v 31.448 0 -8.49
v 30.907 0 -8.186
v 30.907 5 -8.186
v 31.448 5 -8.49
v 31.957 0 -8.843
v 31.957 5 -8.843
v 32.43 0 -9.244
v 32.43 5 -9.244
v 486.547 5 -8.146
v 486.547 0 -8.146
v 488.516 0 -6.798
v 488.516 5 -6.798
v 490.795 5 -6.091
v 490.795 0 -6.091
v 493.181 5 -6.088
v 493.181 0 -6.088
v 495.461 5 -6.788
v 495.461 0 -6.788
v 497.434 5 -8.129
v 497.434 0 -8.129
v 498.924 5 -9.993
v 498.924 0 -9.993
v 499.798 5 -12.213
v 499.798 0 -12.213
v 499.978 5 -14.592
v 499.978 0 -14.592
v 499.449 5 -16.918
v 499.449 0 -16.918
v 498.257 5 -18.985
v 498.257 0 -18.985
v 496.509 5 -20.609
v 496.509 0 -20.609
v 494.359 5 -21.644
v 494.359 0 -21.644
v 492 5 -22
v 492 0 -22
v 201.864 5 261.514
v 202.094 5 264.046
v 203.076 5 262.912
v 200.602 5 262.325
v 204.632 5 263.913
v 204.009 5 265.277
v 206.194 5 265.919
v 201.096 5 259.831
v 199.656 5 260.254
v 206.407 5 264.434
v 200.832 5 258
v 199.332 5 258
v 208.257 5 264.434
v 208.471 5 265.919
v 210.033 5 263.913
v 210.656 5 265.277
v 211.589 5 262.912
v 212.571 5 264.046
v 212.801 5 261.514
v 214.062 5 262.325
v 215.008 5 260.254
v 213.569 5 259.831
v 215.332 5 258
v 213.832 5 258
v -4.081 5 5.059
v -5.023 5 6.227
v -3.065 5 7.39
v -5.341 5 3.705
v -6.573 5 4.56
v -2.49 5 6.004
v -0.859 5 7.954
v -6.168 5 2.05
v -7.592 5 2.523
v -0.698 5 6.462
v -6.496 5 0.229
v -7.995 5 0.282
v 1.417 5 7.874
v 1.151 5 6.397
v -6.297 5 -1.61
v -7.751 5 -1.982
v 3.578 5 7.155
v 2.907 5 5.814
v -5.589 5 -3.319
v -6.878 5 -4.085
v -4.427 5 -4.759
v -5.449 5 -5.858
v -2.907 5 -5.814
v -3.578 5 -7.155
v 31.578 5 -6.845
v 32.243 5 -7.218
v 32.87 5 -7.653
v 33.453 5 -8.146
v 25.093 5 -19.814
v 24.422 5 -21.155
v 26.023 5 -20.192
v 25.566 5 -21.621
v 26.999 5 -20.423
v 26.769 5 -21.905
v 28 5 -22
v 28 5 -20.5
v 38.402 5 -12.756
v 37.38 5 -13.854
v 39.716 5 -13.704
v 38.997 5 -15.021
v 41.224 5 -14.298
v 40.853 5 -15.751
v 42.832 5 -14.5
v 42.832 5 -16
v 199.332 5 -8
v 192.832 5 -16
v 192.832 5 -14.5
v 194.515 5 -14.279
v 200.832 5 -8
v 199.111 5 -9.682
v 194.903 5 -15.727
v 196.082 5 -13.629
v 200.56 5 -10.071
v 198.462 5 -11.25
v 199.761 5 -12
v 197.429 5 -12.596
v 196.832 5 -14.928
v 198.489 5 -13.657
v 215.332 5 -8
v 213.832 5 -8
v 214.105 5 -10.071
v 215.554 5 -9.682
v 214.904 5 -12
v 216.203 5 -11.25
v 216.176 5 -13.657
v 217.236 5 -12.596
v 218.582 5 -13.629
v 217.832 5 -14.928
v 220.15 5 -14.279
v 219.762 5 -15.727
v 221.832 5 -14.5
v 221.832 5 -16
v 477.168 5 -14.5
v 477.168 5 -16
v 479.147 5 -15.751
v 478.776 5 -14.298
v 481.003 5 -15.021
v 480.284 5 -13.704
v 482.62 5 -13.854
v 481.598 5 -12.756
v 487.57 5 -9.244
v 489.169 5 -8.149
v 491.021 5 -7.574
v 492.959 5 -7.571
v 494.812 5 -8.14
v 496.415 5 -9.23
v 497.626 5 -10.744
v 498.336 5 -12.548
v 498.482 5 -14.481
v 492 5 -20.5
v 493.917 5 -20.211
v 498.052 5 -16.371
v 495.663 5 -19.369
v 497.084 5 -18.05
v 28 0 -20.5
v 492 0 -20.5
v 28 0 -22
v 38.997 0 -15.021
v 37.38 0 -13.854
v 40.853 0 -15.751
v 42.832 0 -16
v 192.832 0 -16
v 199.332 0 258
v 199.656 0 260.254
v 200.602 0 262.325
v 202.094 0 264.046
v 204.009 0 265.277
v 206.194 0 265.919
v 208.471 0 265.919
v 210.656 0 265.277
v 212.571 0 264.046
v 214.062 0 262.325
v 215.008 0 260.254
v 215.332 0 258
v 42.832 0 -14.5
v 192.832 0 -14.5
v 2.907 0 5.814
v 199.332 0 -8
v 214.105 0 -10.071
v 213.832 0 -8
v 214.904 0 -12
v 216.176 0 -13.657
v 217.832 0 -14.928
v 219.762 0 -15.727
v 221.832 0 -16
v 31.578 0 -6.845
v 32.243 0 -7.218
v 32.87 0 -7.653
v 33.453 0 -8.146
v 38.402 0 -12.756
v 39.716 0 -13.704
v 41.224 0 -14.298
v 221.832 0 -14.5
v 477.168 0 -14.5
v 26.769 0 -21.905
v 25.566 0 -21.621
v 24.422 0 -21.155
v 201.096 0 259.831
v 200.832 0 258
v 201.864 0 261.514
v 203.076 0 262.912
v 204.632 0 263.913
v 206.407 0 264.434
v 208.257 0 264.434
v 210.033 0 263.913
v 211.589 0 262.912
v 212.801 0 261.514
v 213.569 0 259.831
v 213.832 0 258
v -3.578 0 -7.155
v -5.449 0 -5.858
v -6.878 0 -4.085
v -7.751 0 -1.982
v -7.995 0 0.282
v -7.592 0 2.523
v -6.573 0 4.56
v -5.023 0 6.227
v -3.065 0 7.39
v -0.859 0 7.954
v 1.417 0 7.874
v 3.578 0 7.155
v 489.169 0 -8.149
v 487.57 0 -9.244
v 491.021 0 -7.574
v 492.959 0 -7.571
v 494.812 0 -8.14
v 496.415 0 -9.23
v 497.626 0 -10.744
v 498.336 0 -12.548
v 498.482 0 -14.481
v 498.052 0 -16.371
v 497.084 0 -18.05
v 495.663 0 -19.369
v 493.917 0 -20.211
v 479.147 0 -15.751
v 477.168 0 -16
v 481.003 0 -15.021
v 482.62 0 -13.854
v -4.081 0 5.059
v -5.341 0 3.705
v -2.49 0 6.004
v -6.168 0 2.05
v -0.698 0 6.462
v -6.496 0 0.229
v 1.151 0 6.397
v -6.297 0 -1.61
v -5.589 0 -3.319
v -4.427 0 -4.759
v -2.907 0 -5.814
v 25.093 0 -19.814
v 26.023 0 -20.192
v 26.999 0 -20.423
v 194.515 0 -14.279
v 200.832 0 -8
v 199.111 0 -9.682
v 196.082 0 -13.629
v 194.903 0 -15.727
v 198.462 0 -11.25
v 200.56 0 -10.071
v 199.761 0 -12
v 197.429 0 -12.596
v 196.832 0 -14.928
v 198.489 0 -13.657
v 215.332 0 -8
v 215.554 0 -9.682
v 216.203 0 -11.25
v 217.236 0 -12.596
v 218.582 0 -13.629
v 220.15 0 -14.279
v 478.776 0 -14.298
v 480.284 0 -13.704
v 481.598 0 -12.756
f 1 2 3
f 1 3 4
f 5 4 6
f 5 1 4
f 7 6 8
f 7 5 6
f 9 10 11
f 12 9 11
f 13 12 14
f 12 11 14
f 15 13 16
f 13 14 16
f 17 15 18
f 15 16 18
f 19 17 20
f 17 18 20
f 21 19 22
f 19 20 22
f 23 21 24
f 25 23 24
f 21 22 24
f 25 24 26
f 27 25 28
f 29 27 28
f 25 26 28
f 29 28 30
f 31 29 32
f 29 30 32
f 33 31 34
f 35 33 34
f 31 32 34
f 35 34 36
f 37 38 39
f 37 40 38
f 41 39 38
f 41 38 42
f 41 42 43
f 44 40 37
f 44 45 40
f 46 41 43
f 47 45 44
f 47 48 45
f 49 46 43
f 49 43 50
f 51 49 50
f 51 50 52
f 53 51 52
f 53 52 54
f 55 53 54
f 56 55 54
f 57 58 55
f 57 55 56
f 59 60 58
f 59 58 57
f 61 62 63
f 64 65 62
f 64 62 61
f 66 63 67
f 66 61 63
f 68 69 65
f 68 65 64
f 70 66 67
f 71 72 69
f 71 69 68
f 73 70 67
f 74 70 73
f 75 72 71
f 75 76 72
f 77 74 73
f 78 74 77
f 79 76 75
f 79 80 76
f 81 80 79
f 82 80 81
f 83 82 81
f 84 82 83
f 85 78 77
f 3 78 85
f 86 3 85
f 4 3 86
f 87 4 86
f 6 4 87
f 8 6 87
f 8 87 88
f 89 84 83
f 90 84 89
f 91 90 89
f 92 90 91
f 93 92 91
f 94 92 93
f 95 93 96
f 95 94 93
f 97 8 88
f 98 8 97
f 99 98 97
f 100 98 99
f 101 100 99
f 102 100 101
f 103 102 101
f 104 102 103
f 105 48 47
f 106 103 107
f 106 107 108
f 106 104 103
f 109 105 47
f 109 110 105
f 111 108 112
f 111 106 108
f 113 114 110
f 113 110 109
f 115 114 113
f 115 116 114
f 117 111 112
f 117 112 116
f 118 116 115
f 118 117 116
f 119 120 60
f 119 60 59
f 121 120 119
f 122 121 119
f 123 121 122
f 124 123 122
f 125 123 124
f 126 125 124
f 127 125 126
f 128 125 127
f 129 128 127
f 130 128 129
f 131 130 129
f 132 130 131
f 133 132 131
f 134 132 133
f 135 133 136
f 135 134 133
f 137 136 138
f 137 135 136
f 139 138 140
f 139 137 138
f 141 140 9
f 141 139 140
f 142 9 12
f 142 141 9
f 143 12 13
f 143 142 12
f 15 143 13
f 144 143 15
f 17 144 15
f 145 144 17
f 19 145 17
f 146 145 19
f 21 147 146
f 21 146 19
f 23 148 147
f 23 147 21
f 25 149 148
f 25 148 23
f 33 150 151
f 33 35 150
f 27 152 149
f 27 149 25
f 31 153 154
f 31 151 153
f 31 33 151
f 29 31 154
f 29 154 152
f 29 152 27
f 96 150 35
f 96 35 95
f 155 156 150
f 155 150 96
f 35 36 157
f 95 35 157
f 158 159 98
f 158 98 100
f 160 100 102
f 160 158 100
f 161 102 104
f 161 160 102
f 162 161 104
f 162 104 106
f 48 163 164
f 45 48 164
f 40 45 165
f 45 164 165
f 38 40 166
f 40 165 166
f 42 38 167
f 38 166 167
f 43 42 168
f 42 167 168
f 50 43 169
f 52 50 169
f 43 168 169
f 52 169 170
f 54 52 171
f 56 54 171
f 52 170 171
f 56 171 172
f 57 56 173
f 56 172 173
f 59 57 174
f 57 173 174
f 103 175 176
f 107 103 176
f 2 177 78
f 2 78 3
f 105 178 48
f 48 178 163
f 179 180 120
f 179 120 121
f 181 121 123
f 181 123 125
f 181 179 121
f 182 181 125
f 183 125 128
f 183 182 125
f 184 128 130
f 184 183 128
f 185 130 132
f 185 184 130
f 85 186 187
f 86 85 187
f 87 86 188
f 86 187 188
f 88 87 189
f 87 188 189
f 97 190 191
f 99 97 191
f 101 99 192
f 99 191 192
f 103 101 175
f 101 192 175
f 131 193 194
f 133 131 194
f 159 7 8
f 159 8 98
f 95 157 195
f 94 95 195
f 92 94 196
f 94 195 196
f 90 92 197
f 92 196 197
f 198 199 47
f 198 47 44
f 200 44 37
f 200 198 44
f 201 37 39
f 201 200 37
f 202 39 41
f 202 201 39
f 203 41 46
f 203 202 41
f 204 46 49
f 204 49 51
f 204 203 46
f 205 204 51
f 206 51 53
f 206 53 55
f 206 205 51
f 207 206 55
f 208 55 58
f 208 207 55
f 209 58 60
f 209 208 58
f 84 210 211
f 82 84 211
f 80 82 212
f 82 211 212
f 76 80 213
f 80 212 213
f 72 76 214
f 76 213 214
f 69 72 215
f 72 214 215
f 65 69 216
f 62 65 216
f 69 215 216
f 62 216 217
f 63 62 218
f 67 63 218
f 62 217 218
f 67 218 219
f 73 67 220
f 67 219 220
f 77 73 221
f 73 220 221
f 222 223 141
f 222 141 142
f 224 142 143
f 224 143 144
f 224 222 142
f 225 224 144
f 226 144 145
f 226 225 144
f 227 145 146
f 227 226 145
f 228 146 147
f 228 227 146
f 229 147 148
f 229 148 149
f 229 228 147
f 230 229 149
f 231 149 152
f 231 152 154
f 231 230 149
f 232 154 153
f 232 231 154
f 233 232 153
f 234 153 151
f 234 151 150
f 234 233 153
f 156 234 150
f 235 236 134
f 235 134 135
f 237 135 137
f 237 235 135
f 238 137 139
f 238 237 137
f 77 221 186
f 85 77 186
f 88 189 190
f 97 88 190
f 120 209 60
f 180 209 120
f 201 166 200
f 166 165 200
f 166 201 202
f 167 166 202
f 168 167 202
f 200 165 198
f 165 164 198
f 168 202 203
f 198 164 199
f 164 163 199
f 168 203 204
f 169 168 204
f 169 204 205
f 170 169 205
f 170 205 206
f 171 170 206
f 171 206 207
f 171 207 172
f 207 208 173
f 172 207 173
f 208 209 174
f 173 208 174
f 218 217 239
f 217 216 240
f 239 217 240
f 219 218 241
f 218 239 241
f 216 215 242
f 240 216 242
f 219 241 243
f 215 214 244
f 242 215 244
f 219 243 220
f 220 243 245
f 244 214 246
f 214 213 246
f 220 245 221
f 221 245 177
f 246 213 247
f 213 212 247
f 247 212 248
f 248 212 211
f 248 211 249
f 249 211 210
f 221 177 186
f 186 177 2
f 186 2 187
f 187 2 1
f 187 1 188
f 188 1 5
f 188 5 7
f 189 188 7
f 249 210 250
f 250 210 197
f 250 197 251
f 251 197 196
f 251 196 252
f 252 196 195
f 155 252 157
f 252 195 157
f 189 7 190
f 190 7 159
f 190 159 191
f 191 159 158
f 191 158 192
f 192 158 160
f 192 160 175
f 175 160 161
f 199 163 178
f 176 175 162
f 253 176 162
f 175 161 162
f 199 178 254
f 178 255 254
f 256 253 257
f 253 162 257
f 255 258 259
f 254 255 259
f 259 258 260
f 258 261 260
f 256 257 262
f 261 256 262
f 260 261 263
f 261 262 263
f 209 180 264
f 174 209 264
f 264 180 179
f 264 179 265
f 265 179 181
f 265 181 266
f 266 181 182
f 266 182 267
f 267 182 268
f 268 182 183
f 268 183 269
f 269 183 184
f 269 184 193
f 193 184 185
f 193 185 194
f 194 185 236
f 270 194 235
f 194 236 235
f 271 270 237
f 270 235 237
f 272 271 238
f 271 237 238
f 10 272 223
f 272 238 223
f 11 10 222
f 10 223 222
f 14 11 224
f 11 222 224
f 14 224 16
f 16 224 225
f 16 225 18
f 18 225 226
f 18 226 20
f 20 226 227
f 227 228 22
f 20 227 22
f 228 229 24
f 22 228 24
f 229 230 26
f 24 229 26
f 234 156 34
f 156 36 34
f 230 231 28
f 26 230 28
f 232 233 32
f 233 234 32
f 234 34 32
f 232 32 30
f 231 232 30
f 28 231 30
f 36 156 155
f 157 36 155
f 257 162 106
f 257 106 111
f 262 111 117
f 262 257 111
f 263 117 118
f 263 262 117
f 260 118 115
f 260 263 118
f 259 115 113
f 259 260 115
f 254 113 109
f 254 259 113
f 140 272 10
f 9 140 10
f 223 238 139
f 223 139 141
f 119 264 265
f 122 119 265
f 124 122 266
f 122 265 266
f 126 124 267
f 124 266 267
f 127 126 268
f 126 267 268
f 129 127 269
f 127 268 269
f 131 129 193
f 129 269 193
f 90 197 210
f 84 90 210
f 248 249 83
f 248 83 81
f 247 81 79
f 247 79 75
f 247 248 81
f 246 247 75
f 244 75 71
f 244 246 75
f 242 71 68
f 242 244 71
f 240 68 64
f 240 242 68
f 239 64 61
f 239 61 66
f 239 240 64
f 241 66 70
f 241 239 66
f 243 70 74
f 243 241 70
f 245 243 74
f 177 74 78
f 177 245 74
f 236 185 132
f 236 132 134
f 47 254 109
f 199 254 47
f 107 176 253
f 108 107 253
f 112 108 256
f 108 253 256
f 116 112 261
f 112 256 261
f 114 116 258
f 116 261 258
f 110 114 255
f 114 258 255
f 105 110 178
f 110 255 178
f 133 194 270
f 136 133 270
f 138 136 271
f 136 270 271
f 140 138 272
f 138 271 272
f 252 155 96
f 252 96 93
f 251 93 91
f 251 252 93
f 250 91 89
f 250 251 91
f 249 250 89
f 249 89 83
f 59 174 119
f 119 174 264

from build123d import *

# Parameters (mm, degrees)
BOSS_EXTRUDE1_DEPTH = 5


with BuildPart() as part:
    # Sketch2 → Boss-Extrude1 (new body)
    with BuildSketch(Plane(origin=(0, 0, 0), x_dir=(1, 0, 0), z_dir=(0, 1, 0))):
        with BuildLine():
            Line((3.577708764, -7.155417528), (31.577708764, 6.844582472))
            ThreePointArc((31.577708764, 6.844582472), (32.561861408, 7.42813417), (33.452703386, 8.1461102))
            Line((33.452703386, 8.1461102), (38.402075473, 12.756285462))
            ThreePointArc((38.402075473, 12.756285462), (40.451835644, 14.048382243), (42.832396974, 14.5))
            Line((42.832396974, 14.5), (192.832396974, 14.5))
            ThreePointArc((192.832396974, 14.5), (197.428591052, 12.596194078), (199.332396974, 8))
            Line((199.332396974, 8), (199.332396974, -258))
            ThreePointArc((199.332396974, -258), (207.332396974, -266), (215.332396974, -258))
            Line((215.332396974, -258), (215.332396974, 8))
            ThreePointArc((215.332396974, 8), (217.236202896, 12.596194078), (221.832396974, 14.5))
            Line((221.832396974, 14.5), (477.167603026, 14.5))
            ThreePointArc((477.167603026, 14.5), (479.548164356, 14.048382243), (481.597924527, 12.756285462))
            Line((481.597924527, 12.756285462), (486.547296614, 8.1461102))
            ThreePointArc((486.547296614, 8.1461102), (499.44416276, 11.070078362), (492, 22))
            Line((492, 22), (28, 22))
            ThreePointArc((28, 22), (26.161976636, 21.785991916), (24.422291236, 21.155417528))
            Line((24.422291236, 21.155417528), (-3.577708764, 7.155417528))
            ThreePointArc((-3.577708764, 7.155417528), (-7.155417528, -3.577708764), (3.577708764, -7.155417528))
        make_face()
        with BuildLine():
            Line((2.906888371, -5.813776741), (30.906888371, 8.186223259))
            ThreePointArc((30.906888371, 8.186223259), (31.706512394, 8.660359013), (32.430321501, 9.243714538))
            Line((32.430321501, 9.243714538), (37.379693588, 13.8538898))
            ThreePointArc((37.379693588, 13.8538898), (39.902475337, 15.44416276), (42.832396974, 16))
            Line((42.832396974, 16), (192.832396974, 16))
            ThreePointArc((192.832396974, 16), (198.489251224, 13.656854249), (200.832396974, 8))
            Line((200.832396974, 8), (200.832396974, -258))
            ThreePointArc((200.832396974, -258), (207.332396974, -264.5), (213.832396974, -258))
            Line((213.832396974, -258), (213.832396974, 8))
            ThreePointArc((213.832396974, 8), (216.175542725, 13.656854249), (221.832396974, 16))
            Line((221.832396974, 16), (477.167603026, 16))
            ThreePointArc((477.167603026, 16), (480.097524663, 15.44416276), (482.620306412, 13.8538898))
            Line((482.620306412, 13.8538898), (487.569678499, 9.243714538))
            ThreePointArc((487.569678499, 9.243714538), (498.048382243, 11.61943867), (492, 20.5))
            Line((492, 20.5), (28, 20.5))
            ThreePointArc((28, 20.5), (26.506606016, 20.326118432), (25.093111629, 19.813776741))
            Line((25.093111629, 19.813776741), (-2.906888371, 5.813776741))
            ThreePointArc((-2.906888371, 5.813776741), (-5.813776741, -2.906888371), (2.906888371, -5.813776741))
        make_face(mode=Mode.SUBTRACT)
    extrude(amount=BOSS_EXTRUDE1_DEPTH)


solid = part.part
